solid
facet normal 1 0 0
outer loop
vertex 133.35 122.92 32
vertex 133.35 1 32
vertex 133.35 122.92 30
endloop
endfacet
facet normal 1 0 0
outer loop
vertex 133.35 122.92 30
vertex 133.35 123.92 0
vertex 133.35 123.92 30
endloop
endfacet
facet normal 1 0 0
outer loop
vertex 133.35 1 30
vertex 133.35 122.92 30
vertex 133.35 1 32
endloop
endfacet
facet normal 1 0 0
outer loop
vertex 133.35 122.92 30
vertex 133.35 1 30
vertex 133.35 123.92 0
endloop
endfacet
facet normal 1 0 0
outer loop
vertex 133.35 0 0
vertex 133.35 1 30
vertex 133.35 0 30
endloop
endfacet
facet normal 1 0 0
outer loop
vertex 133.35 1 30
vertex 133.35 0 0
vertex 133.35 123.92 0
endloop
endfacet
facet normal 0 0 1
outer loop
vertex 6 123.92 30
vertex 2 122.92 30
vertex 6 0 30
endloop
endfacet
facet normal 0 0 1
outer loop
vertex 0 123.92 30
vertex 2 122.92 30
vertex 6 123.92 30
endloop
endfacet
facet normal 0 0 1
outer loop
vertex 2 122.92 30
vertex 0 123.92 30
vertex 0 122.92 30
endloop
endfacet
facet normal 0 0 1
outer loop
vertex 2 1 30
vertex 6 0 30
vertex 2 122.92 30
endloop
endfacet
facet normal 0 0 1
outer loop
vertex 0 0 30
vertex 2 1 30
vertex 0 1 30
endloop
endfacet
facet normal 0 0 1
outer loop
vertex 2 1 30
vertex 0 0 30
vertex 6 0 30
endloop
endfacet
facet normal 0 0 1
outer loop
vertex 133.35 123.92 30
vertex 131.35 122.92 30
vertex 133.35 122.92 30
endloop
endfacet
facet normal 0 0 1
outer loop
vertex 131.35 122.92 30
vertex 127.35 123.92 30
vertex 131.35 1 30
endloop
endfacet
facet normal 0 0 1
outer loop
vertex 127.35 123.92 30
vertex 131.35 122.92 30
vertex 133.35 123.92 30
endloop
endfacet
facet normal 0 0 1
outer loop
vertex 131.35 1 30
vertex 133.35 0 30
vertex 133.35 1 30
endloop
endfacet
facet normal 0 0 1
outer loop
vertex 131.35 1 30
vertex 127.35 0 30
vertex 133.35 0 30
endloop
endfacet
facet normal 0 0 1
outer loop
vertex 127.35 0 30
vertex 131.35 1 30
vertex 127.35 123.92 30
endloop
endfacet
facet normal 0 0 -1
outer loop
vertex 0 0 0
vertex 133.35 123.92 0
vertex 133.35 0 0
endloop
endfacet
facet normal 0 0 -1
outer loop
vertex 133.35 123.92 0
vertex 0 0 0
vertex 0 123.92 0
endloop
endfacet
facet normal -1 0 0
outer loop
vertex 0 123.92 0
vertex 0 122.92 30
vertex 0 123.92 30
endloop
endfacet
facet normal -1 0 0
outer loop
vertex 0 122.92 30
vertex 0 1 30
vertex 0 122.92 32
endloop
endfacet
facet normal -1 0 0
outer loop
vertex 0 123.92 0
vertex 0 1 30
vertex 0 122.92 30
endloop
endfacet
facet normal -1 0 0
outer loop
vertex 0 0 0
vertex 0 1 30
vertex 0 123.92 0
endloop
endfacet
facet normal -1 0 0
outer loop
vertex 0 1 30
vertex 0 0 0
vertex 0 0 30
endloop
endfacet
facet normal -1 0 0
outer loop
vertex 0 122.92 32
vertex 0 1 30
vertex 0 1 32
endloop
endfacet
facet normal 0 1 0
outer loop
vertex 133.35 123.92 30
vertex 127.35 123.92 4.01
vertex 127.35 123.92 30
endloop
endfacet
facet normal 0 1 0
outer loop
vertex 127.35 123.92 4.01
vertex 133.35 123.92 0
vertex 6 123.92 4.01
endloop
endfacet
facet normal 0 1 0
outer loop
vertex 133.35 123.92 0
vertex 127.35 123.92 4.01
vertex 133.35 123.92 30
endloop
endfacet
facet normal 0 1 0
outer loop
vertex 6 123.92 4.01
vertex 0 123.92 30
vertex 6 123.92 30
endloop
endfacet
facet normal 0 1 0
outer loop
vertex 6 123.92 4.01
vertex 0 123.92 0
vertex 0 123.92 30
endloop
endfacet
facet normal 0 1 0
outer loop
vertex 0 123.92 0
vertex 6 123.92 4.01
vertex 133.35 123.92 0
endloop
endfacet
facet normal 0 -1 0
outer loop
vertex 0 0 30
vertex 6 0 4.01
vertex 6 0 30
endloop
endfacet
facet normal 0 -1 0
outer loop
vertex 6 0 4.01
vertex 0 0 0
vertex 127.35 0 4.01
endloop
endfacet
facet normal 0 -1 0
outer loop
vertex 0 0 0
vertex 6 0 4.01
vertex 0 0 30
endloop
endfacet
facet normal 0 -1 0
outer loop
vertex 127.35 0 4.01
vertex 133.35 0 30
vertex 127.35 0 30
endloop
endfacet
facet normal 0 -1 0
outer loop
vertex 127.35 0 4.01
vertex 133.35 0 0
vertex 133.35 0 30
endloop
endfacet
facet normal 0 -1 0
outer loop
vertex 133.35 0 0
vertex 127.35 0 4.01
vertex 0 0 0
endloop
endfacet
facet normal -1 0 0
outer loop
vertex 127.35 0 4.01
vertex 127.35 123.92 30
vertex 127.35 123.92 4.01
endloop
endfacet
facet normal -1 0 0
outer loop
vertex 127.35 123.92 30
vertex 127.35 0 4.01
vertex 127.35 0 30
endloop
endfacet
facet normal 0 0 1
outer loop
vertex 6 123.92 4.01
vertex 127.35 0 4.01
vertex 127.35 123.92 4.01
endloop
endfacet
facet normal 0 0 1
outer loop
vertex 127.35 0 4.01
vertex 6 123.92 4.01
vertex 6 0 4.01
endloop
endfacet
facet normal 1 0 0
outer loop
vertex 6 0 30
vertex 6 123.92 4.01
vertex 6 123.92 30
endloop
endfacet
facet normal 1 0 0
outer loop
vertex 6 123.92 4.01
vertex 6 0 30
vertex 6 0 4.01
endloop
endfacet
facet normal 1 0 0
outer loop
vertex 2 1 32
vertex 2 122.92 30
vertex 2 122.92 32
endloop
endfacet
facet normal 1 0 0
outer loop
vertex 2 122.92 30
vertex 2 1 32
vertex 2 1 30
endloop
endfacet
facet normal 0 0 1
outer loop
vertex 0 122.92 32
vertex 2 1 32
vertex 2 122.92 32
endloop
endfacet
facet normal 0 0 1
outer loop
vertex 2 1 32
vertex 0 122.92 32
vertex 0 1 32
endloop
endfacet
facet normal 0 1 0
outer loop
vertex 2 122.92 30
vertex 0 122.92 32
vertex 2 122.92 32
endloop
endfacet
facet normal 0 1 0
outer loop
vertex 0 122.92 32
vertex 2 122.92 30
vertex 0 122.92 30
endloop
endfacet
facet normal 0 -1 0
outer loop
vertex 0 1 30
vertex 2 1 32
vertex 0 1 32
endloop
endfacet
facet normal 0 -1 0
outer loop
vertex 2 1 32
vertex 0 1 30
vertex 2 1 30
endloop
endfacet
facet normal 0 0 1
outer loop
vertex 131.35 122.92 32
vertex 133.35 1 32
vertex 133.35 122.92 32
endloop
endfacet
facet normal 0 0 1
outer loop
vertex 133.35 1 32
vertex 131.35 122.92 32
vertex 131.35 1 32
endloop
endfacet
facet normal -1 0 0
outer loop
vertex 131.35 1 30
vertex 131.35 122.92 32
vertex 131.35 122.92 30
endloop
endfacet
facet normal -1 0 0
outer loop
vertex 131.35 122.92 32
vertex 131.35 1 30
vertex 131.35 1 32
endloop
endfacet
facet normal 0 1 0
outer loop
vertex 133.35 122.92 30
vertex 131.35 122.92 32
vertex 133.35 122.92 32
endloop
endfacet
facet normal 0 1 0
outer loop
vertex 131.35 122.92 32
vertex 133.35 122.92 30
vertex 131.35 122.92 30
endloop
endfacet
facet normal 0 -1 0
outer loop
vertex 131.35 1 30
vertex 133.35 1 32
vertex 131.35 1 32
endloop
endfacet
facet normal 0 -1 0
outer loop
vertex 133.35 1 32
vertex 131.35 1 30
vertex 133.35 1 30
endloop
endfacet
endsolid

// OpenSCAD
// Helper for OpenSCAD
_DELTA = 0.01;

// Definitions for Eurorack dimensions
ONE_HP = 25.4*0.2;
ONE_U  = 1.75*25.4;

// thickness of the case bottom
BOTTOM_THICKNESS = 4;
// thickness of the case front and back (includes module mounting holes)
SIDE_THICKNESS = 6;

// The amount by which the main body is inset into the side
SIDE_INSET = 1;
// Maximal dimensions of the outside of the case body
//  These are also used to define the dimensions of the sides
OUTER_X = 3*ONE_U;
OUTER_Y = 24*ONE_HP + 2*SIDE_INSET;
OUTER_Z = 30;

module body() {
    difference() {
        cube([OUTER_X, OUTER_Y, OUTER_Z]);
        translate([SIDE_THICKNESS, -_DELTA, BOTTOM_THICKNESS+_DELTA])
            cube([OUTER_X - 2*SIDE_THICKNESS, OUTER_Y + 2*_DELTA, OUTER_Z - BOTTOM_THICKNESS]);
    }
}

LIP_THICKNESS = 2;
module lip() {
    translate([0, SIDE_INSET, 0])
        cube([LIP_THICKNESS, OUTER_Y - 2*SIDE_INSET, LIP_THICKNESS]);
}

body();
translate([0, 0, OUTER_Z])
    lip();
translate([OUTER_X-LIP_THICKNESS, 0, OUTER_Z])
    lip();
